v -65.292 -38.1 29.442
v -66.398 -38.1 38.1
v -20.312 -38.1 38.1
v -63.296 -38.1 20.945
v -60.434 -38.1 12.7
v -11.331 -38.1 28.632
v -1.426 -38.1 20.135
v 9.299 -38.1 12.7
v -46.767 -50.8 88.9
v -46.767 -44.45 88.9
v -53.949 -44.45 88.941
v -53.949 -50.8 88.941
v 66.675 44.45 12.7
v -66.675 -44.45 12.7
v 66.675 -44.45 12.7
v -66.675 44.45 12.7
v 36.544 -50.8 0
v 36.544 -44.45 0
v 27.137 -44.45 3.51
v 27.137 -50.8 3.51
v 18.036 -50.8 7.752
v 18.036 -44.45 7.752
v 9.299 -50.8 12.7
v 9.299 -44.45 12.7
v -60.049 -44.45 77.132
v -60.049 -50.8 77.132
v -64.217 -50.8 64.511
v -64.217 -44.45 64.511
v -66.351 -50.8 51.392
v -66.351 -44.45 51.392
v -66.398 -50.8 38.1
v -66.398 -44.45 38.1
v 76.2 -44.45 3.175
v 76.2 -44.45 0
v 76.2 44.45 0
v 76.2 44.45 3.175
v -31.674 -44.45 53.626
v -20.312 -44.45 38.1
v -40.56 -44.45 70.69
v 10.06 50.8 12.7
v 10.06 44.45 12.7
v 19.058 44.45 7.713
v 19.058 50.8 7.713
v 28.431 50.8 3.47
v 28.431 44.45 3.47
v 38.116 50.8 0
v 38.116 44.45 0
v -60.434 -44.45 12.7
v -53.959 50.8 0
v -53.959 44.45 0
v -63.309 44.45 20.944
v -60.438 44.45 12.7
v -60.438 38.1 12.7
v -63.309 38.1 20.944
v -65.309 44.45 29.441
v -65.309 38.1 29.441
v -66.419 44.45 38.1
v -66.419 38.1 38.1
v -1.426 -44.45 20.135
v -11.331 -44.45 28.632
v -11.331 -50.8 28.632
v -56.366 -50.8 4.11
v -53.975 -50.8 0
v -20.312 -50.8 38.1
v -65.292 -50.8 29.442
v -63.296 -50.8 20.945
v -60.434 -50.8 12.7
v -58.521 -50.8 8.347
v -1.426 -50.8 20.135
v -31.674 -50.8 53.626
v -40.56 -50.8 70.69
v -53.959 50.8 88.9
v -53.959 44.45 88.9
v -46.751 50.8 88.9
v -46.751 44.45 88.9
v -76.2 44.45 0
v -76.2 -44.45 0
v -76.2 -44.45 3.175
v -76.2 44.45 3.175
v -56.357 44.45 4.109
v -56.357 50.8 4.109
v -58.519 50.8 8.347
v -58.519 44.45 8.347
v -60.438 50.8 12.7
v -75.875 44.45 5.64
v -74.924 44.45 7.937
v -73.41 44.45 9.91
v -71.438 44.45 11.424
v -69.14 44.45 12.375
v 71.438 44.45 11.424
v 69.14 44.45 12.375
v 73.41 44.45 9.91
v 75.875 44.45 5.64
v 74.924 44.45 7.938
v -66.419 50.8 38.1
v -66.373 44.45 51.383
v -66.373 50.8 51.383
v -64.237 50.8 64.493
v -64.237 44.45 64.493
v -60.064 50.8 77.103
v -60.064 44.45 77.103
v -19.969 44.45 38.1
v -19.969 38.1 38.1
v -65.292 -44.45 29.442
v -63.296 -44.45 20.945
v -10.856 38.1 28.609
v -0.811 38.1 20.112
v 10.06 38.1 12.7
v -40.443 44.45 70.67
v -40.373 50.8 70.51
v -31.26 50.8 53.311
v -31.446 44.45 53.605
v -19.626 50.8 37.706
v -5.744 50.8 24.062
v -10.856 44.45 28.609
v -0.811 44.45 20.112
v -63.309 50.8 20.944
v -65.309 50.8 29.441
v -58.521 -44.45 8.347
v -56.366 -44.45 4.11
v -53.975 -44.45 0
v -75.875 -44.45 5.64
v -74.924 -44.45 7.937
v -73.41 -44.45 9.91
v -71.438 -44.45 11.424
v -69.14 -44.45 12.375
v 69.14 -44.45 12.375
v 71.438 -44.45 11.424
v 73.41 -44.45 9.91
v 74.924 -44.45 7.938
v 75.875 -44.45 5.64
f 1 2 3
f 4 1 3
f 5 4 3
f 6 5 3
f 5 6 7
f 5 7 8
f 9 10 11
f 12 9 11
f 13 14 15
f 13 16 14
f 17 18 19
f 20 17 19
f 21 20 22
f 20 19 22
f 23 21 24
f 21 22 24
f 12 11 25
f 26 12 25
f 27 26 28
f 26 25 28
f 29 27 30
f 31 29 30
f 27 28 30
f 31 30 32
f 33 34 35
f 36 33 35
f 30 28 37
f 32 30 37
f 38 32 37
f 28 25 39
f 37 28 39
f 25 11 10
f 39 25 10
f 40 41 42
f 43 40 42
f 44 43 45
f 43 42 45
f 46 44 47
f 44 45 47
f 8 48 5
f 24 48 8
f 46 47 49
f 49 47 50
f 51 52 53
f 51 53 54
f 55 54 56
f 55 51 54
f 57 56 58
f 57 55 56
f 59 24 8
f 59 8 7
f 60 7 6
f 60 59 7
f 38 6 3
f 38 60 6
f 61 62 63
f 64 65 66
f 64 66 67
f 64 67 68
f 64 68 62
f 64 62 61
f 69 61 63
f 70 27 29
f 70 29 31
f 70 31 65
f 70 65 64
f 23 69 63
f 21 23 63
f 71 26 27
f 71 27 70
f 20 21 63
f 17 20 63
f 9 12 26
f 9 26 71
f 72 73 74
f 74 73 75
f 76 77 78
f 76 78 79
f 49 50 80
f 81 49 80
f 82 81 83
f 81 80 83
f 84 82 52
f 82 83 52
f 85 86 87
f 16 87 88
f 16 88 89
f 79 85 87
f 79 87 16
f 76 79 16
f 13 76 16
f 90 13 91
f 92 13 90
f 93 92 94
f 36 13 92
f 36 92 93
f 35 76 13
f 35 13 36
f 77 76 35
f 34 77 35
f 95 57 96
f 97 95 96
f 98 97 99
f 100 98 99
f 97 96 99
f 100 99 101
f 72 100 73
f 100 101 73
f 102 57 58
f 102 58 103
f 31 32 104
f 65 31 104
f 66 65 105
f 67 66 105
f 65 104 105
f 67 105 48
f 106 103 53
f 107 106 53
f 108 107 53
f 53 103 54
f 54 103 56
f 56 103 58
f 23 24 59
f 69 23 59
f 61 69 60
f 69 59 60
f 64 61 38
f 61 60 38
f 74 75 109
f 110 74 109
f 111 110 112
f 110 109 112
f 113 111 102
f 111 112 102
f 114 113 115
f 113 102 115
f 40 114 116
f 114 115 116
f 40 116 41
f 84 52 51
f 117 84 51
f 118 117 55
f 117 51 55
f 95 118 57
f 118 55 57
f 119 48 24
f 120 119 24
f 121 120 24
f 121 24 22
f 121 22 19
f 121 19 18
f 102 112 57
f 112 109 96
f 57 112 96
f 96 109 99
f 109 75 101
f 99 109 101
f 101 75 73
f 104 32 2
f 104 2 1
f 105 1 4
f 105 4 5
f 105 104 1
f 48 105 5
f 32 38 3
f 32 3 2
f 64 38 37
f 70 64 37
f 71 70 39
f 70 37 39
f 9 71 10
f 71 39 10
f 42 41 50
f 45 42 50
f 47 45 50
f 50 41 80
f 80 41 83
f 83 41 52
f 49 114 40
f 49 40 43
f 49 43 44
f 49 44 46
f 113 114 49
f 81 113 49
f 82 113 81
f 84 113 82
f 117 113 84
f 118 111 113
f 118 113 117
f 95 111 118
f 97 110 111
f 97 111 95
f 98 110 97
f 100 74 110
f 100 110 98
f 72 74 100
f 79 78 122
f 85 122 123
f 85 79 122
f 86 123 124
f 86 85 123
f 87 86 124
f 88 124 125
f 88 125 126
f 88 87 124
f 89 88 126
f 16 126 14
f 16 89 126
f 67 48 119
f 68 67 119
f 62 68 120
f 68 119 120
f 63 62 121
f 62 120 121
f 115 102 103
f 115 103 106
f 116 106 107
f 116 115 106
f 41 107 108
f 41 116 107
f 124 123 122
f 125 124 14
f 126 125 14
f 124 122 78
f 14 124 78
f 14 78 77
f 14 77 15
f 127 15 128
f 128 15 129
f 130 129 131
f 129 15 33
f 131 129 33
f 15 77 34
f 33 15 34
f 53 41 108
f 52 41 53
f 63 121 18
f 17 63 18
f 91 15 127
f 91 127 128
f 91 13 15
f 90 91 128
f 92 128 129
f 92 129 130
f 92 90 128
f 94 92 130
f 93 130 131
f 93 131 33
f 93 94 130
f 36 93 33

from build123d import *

# Parameters (mm, degrees)
F0_W      = 152.4
F0_H      = 88.9
F1_DEPTH  = 12.7
F3_R      = 9.525
F4_R      = 9.525
F6_DEPTH  = 6.35
F7_DEPTH  = 6.35
F9_DEPTH  = 6.35
F10_DEPTH = 6.35


with BuildPart() as f1:
    # F0 (on Top) → F1 (new body)
    with BuildSketch(Plane.XY):
        Rectangle(F0_W, F0_H)
    extrude(amount=F1_DEPTH)

    # F3
    f3_edges = [f1.edges().sort_by_distance(p)[0] for p in [
        (-76.2, 0, 12.7),
    ]]
    fillet(f3_edges, radius=F3_R)

    # F4
    f4_edges = [f1.edges().sort_by_distance(p)[0] for p in [
        (76.2, 0, 12.7),
    ]]
    fillet(f4_edges, radius=F4_R)


with BuildPart() as f6:
    # F2 (on face) → F6 (new body)
    with BuildSketch(Plane.XZ.offset(44.45)):
        with BuildLine():
            Line((-46.7672212421, 88.9), (-53.949354118, 88.9411901131))
            ThreePointArc((-53.949354118, 88.9411901131), (-64.2172051604, 64.5106633707), (-66.3980908187, 38.1))
            Line((-66.3980908187, 38.1), (-20.3116443752, 38.1))
            ThreePointArc((-20.3116443752, 38.1), (-36.4405926527, 61.9891366681), (-46.7672212421, 88.9))
        make_face()
        with BuildLine():
            Line((-20.3116443752, 38.1), (-66.3980908187, 38.1))
            ThreePointArc((-66.3980908187, 38.1), (-64.4039846699, 25.1679956225), (-60.4338106551, 12.7))
            Line((-60.4338106551, 12.7), (9.2985986694, 12.7))
            ThreePointArc((9.2985986694, 12.7), (-6.4876404108, 24.2562547502), (-20.3116443752, 38.1))
        make_face()
        with BuildLine():
            Line((9.2985986694, 12.7), (-60.4338106551, 12.7))
            ThreePointArc((-60.4338106551, 12.7), (-57.4730413053, 6.2133804004), (-53.975, 0))
            Line((-53.975, 0), (36.5442627102, 0))
            ThreePointArc((36.5442627102, 0), (22.5443530675, 5.5410448651), (9.2985986694, 12.7))
        make_face()
    extrude(amount=F6_DEPTH)

    # F2 (on face) → F7 (join)
    with BuildSketch(Plane.XZ.offset(44.45)):
        with BuildLine():
            Line((-20.3116443752, 38.1), (-66.3980908187, 38.1))
            ThreePointArc((-66.3980908187, 38.1), (-64.4039846699, 25.1679956225), (-60.4338106551, 12.7))
            Line((-60.4338106551, 12.7), (9.2985986694, 12.7))
            ThreePointArc((9.2985986694, 12.7), (-6.4876404108, 24.2562547502), (-20.3116443752, 38.1))
        make_face()
    extrude(amount=-F7_DEPTH)


with BuildPart() as f9:
    # F8 (on face) → F9 (new body)
    with BuildSketch(Plane(origin=(0, 44.45, 0), x_dir=(-1, 0, 0), z_dir=(0, 1, 0))):
        with BuildLine():
            ThreePointArc((46.751059991, 88.9), (36.2689527155, 61.9663203319), (19.9687555629, 38.1))
            Line((19.9687555629, 38.1), (66.4188739109, 38.1))
            ThreePointArc((66.4188739109, 38.1), (64.2367184959, 64.492844585), (53.9588387489, 88.9))
            Line((53.9588387489, 88.9), (46.751059991, 88.9))
        make_face()
        with BuildLine():
            ThreePointArc((19.9687555629, 38.1), (5.9435943919, 24.2304998237), (-10.0600225377, 12.7))
            Line((-10.0600225377, 12.7), (60.4383228169, 12.7))
            ThreePointArc((60.4383228169, 12.7), (64.4192914608, 25.1667365872), (66.4188739109, 38.1))
            Line((66.4188739109, 38.1), (19.9687555629, 38.1))
        make_face()
        with BuildLine():
            ThreePointArc((-10.0600225377, 12.7), (-23.7017078095, 5.4964216156), (-38.1161612511, 0))
            Line((-38.1161612511, 0), (53.9588387489, 0))
            ThreePointArc((53.9588387489, 0), (57.4680730194, 6.2125062478), (60.4383228169, 12.7))
            Line((60.4383228169, 12.7), (-10.0600225377, 12.7))
        make_face()
    extrude(amount=F9_DEPTH)

    # F8 (on face) → F10 (join)
    with BuildSketch(Plane(origin=(0, 44.45, 0), x_dir=(-1, 0, 0), z_dir=(0, 1, 0))):
        with BuildLine():
            ThreePointArc((19.9687555629, 38.1), (5.9435943919, 24.2304998237), (-10.0600225377, 12.7))
            Line((-10.0600225377, 12.7), (60.4383228169, 12.7))
            ThreePointArc((60.4383228169, 12.7), (64.4192914608, 25.1667365872), (66.4188739109, 38.1))
            Line((66.4188739109, 38.1), (19.9687555629, 38.1))
        make_face()
    extrude(amount=-F10_DEPTH)


solid = Compound([f1.part, f6.part, f9.part])
